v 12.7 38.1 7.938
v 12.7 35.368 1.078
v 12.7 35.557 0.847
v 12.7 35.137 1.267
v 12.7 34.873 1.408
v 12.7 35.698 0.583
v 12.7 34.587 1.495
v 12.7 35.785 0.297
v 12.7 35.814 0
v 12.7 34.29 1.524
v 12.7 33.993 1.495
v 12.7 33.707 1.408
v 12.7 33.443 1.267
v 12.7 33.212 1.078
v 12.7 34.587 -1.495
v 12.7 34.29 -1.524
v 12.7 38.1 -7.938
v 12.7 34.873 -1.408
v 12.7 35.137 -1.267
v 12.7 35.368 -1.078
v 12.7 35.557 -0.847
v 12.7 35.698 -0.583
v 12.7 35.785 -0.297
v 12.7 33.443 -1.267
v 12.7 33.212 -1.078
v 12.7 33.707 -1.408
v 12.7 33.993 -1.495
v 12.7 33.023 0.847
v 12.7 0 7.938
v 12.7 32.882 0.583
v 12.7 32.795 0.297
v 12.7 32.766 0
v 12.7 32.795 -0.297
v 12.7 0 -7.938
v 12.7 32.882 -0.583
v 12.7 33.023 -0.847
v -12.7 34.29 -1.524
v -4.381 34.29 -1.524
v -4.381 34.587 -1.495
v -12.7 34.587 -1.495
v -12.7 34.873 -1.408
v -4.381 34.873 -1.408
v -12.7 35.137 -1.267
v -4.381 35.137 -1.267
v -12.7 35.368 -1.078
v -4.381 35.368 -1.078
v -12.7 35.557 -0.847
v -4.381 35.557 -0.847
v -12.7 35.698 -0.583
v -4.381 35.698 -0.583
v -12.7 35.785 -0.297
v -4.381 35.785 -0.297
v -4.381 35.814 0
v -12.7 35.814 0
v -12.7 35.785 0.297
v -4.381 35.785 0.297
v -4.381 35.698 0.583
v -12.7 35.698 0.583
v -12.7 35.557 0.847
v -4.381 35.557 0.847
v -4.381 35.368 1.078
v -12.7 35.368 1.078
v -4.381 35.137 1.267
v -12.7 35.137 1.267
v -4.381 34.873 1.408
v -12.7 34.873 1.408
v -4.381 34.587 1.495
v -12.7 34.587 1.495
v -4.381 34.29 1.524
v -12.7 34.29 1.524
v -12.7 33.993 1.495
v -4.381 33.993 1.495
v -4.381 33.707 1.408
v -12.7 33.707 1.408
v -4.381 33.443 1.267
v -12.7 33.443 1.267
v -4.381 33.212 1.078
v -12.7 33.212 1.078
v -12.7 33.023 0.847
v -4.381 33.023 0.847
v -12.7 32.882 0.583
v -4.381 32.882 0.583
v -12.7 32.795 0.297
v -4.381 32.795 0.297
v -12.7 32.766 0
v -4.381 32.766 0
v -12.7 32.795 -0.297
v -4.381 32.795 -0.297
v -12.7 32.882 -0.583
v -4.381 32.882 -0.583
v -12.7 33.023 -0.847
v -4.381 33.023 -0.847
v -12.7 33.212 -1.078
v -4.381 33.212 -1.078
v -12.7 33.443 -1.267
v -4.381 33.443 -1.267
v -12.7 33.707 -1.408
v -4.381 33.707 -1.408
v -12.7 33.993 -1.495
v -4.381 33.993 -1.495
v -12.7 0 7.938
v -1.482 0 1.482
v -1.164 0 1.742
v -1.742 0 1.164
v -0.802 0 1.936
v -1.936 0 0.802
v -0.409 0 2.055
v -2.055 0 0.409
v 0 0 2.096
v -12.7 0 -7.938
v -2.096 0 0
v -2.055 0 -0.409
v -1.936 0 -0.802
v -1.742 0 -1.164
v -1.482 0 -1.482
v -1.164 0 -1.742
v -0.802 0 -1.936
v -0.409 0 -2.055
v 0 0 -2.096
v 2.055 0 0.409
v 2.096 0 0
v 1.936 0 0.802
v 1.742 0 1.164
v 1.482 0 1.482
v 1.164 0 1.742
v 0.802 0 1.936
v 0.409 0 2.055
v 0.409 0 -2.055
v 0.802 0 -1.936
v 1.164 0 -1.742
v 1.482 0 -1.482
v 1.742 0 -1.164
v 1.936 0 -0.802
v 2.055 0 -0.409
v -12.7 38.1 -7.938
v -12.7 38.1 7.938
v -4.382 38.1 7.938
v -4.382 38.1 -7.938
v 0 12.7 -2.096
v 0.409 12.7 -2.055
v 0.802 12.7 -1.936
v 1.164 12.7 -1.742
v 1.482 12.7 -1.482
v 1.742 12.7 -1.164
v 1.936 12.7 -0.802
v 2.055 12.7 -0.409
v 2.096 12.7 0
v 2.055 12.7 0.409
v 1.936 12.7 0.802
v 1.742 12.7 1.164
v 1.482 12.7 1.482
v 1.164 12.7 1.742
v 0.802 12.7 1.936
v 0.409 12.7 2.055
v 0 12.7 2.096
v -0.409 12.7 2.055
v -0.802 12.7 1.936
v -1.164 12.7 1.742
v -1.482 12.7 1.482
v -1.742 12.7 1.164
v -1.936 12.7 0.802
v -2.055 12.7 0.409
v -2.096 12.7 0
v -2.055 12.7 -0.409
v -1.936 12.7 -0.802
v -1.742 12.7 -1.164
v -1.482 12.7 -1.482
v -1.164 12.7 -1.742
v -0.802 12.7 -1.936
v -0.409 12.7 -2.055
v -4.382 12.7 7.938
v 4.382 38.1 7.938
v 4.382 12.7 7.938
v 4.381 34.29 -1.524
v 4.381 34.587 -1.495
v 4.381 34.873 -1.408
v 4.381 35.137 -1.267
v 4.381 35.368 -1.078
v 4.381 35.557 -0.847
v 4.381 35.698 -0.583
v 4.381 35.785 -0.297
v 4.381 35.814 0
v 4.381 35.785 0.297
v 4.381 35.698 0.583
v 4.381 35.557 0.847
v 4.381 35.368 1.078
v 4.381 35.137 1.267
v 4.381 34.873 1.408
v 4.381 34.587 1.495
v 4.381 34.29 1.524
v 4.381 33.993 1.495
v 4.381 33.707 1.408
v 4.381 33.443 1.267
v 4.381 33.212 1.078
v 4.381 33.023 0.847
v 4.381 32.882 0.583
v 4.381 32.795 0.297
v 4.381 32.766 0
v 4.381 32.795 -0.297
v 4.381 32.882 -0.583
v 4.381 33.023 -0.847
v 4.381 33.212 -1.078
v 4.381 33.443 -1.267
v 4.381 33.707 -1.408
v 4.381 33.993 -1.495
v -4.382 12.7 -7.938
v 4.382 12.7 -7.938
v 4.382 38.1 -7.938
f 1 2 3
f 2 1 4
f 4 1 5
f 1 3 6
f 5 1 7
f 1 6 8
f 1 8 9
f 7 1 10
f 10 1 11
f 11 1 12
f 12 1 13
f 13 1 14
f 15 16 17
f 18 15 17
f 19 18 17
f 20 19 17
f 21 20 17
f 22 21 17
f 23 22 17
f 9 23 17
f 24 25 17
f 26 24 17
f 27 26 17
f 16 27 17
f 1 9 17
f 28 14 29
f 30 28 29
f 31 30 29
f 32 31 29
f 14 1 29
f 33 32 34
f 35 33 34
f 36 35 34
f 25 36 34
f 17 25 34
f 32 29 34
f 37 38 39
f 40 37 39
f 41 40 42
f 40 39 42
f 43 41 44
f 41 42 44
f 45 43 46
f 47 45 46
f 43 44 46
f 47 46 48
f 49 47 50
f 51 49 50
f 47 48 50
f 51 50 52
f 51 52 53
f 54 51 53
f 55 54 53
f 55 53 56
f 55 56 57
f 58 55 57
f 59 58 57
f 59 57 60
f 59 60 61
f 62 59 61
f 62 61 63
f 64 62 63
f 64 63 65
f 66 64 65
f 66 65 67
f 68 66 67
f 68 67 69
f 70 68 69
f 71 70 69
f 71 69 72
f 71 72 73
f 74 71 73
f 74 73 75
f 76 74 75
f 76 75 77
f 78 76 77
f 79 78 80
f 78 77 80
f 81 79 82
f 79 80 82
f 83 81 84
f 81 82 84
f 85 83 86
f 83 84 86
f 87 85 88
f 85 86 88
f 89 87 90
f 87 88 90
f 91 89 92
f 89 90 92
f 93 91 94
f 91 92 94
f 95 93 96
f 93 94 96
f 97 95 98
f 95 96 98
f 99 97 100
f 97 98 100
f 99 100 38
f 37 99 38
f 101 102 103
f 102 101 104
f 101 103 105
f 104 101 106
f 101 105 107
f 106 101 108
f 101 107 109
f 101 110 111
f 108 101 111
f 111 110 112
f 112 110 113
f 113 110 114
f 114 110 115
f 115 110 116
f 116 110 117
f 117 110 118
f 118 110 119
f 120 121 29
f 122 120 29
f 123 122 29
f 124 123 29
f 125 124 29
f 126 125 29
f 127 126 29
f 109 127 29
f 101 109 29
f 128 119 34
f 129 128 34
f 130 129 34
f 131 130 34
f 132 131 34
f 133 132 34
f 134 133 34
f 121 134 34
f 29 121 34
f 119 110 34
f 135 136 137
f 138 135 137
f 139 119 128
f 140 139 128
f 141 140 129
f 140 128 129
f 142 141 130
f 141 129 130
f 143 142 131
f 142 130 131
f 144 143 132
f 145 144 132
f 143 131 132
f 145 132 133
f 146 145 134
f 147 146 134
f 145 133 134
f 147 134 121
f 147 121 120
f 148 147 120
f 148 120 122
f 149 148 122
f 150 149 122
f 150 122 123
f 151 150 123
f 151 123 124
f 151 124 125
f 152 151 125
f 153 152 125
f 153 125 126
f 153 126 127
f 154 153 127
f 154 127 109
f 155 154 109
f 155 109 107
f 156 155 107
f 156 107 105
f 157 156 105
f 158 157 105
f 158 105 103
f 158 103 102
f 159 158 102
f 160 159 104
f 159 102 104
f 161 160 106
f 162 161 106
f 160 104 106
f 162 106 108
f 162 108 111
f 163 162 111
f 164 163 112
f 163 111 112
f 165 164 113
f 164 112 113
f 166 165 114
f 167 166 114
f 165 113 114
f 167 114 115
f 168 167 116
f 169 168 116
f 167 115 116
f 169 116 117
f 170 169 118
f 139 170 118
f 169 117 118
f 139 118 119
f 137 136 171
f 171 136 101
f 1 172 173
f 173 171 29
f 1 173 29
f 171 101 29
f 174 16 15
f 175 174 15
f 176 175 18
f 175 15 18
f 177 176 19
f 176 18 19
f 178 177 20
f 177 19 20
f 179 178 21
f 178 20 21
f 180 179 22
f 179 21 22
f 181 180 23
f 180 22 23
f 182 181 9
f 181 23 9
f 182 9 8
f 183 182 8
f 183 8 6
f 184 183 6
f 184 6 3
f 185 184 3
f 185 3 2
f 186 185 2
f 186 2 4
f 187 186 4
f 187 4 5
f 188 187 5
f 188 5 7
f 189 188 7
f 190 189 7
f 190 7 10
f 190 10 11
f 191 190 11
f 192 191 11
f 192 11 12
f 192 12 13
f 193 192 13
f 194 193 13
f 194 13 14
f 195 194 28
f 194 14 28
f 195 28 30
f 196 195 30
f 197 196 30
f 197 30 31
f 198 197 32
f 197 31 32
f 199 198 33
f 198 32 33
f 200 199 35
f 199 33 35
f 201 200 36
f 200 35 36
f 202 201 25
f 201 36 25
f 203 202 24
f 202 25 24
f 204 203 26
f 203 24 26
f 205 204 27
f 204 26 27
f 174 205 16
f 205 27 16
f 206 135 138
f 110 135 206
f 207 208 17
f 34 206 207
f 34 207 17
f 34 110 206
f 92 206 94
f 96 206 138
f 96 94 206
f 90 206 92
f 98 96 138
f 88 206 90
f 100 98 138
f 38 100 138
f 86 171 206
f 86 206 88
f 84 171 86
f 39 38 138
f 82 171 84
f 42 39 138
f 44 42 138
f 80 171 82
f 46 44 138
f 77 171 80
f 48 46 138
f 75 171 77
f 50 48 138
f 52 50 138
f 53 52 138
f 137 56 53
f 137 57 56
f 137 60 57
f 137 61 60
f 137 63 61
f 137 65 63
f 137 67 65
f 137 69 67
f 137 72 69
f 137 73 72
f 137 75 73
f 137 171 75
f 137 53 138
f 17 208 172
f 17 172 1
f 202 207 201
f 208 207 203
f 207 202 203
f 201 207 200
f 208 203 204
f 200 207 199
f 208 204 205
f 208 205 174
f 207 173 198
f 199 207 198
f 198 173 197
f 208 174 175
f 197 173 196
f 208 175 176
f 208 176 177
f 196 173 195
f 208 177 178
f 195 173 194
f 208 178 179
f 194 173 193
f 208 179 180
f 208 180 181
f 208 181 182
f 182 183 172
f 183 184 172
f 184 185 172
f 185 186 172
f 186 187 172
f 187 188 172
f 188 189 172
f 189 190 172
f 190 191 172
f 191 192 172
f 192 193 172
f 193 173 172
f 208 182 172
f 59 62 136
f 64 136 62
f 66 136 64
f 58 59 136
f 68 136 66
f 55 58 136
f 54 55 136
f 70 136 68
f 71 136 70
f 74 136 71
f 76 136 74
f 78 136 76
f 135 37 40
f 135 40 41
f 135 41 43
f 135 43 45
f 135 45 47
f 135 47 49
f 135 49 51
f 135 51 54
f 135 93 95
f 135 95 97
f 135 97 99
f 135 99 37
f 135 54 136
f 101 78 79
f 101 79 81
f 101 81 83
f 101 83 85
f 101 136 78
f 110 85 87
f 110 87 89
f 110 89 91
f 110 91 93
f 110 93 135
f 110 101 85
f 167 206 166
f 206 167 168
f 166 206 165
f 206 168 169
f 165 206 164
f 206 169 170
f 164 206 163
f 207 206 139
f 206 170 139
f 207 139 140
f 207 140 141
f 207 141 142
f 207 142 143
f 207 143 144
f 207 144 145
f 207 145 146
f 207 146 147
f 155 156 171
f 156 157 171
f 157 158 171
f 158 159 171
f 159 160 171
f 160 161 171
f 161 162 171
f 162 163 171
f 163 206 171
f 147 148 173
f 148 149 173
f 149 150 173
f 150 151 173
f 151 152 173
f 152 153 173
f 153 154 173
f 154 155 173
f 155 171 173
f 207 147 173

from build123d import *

# Parameters (mm, degrees)
SKETCH1_W           = 25.4
SKETCH1_H           = 15.875
BOSS_EXTRUDE1_DEPTH = 38.1
SKETCH2_W           = 8.763
SKETCH2_H           = 25.4
CUT_EXTRUDE1_DEPTH  = 44.184668865
SKETCH3_R           = 1.524
CUT_EXTRUDE2_DEPTH  = 47.473367709
SKETCH4_R           = 2.0955
CUT_EXTRUDE3_DEPTH  = 41.937805342


with BuildPart() as part:
    # Sketch1 → Boss-Extrude1 (new body)
    with BuildSketch(Plane(origin=(0, 0, 0), x_dir=(1, 0, 0), z_dir=(0, 1, 0))):
        Rectangle(SKETCH1_W, SKETCH1_H)
    extrude(amount=BOSS_EXTRUDE1_DEPTH)

    # Sketch2 → Cut-Extrude1 (cut, through all)
    with BuildSketch(Plane.XY.offset(7.9375)):
        with Locations((0, 25.4)):
            Rectangle(SKETCH2_W, SKETCH2_H)
    extrude(amount=-CUT_EXTRUDE1_DEPTH, mode=Mode.SUBTRACT)

    # Sketch3 → Cut-Extrude2 (cut, through all)
    with BuildSketch(Plane(origin=(12.7, 0, 0), x_dir=(0, 0, -1), z_dir=(1, 0, 0))):
        with Locations((0, 34.29)):
            Circle(SKETCH3_R)
    extrude(amount=-CUT_EXTRUDE2_DEPTH, mode=Mode.SUBTRACT)

    # Sketch4 → Cut-Extrude3 (cut, through all)
    with BuildSketch(Plane.XZ):
        with Locations(Location((0, 0, 0), (0, 0, 270))):
            Circle(SKETCH4_R)
    extrude(amount=-CUT_EXTRUDE3_DEPTH, mode=Mode.SUBTRACT)


solid = part.part
